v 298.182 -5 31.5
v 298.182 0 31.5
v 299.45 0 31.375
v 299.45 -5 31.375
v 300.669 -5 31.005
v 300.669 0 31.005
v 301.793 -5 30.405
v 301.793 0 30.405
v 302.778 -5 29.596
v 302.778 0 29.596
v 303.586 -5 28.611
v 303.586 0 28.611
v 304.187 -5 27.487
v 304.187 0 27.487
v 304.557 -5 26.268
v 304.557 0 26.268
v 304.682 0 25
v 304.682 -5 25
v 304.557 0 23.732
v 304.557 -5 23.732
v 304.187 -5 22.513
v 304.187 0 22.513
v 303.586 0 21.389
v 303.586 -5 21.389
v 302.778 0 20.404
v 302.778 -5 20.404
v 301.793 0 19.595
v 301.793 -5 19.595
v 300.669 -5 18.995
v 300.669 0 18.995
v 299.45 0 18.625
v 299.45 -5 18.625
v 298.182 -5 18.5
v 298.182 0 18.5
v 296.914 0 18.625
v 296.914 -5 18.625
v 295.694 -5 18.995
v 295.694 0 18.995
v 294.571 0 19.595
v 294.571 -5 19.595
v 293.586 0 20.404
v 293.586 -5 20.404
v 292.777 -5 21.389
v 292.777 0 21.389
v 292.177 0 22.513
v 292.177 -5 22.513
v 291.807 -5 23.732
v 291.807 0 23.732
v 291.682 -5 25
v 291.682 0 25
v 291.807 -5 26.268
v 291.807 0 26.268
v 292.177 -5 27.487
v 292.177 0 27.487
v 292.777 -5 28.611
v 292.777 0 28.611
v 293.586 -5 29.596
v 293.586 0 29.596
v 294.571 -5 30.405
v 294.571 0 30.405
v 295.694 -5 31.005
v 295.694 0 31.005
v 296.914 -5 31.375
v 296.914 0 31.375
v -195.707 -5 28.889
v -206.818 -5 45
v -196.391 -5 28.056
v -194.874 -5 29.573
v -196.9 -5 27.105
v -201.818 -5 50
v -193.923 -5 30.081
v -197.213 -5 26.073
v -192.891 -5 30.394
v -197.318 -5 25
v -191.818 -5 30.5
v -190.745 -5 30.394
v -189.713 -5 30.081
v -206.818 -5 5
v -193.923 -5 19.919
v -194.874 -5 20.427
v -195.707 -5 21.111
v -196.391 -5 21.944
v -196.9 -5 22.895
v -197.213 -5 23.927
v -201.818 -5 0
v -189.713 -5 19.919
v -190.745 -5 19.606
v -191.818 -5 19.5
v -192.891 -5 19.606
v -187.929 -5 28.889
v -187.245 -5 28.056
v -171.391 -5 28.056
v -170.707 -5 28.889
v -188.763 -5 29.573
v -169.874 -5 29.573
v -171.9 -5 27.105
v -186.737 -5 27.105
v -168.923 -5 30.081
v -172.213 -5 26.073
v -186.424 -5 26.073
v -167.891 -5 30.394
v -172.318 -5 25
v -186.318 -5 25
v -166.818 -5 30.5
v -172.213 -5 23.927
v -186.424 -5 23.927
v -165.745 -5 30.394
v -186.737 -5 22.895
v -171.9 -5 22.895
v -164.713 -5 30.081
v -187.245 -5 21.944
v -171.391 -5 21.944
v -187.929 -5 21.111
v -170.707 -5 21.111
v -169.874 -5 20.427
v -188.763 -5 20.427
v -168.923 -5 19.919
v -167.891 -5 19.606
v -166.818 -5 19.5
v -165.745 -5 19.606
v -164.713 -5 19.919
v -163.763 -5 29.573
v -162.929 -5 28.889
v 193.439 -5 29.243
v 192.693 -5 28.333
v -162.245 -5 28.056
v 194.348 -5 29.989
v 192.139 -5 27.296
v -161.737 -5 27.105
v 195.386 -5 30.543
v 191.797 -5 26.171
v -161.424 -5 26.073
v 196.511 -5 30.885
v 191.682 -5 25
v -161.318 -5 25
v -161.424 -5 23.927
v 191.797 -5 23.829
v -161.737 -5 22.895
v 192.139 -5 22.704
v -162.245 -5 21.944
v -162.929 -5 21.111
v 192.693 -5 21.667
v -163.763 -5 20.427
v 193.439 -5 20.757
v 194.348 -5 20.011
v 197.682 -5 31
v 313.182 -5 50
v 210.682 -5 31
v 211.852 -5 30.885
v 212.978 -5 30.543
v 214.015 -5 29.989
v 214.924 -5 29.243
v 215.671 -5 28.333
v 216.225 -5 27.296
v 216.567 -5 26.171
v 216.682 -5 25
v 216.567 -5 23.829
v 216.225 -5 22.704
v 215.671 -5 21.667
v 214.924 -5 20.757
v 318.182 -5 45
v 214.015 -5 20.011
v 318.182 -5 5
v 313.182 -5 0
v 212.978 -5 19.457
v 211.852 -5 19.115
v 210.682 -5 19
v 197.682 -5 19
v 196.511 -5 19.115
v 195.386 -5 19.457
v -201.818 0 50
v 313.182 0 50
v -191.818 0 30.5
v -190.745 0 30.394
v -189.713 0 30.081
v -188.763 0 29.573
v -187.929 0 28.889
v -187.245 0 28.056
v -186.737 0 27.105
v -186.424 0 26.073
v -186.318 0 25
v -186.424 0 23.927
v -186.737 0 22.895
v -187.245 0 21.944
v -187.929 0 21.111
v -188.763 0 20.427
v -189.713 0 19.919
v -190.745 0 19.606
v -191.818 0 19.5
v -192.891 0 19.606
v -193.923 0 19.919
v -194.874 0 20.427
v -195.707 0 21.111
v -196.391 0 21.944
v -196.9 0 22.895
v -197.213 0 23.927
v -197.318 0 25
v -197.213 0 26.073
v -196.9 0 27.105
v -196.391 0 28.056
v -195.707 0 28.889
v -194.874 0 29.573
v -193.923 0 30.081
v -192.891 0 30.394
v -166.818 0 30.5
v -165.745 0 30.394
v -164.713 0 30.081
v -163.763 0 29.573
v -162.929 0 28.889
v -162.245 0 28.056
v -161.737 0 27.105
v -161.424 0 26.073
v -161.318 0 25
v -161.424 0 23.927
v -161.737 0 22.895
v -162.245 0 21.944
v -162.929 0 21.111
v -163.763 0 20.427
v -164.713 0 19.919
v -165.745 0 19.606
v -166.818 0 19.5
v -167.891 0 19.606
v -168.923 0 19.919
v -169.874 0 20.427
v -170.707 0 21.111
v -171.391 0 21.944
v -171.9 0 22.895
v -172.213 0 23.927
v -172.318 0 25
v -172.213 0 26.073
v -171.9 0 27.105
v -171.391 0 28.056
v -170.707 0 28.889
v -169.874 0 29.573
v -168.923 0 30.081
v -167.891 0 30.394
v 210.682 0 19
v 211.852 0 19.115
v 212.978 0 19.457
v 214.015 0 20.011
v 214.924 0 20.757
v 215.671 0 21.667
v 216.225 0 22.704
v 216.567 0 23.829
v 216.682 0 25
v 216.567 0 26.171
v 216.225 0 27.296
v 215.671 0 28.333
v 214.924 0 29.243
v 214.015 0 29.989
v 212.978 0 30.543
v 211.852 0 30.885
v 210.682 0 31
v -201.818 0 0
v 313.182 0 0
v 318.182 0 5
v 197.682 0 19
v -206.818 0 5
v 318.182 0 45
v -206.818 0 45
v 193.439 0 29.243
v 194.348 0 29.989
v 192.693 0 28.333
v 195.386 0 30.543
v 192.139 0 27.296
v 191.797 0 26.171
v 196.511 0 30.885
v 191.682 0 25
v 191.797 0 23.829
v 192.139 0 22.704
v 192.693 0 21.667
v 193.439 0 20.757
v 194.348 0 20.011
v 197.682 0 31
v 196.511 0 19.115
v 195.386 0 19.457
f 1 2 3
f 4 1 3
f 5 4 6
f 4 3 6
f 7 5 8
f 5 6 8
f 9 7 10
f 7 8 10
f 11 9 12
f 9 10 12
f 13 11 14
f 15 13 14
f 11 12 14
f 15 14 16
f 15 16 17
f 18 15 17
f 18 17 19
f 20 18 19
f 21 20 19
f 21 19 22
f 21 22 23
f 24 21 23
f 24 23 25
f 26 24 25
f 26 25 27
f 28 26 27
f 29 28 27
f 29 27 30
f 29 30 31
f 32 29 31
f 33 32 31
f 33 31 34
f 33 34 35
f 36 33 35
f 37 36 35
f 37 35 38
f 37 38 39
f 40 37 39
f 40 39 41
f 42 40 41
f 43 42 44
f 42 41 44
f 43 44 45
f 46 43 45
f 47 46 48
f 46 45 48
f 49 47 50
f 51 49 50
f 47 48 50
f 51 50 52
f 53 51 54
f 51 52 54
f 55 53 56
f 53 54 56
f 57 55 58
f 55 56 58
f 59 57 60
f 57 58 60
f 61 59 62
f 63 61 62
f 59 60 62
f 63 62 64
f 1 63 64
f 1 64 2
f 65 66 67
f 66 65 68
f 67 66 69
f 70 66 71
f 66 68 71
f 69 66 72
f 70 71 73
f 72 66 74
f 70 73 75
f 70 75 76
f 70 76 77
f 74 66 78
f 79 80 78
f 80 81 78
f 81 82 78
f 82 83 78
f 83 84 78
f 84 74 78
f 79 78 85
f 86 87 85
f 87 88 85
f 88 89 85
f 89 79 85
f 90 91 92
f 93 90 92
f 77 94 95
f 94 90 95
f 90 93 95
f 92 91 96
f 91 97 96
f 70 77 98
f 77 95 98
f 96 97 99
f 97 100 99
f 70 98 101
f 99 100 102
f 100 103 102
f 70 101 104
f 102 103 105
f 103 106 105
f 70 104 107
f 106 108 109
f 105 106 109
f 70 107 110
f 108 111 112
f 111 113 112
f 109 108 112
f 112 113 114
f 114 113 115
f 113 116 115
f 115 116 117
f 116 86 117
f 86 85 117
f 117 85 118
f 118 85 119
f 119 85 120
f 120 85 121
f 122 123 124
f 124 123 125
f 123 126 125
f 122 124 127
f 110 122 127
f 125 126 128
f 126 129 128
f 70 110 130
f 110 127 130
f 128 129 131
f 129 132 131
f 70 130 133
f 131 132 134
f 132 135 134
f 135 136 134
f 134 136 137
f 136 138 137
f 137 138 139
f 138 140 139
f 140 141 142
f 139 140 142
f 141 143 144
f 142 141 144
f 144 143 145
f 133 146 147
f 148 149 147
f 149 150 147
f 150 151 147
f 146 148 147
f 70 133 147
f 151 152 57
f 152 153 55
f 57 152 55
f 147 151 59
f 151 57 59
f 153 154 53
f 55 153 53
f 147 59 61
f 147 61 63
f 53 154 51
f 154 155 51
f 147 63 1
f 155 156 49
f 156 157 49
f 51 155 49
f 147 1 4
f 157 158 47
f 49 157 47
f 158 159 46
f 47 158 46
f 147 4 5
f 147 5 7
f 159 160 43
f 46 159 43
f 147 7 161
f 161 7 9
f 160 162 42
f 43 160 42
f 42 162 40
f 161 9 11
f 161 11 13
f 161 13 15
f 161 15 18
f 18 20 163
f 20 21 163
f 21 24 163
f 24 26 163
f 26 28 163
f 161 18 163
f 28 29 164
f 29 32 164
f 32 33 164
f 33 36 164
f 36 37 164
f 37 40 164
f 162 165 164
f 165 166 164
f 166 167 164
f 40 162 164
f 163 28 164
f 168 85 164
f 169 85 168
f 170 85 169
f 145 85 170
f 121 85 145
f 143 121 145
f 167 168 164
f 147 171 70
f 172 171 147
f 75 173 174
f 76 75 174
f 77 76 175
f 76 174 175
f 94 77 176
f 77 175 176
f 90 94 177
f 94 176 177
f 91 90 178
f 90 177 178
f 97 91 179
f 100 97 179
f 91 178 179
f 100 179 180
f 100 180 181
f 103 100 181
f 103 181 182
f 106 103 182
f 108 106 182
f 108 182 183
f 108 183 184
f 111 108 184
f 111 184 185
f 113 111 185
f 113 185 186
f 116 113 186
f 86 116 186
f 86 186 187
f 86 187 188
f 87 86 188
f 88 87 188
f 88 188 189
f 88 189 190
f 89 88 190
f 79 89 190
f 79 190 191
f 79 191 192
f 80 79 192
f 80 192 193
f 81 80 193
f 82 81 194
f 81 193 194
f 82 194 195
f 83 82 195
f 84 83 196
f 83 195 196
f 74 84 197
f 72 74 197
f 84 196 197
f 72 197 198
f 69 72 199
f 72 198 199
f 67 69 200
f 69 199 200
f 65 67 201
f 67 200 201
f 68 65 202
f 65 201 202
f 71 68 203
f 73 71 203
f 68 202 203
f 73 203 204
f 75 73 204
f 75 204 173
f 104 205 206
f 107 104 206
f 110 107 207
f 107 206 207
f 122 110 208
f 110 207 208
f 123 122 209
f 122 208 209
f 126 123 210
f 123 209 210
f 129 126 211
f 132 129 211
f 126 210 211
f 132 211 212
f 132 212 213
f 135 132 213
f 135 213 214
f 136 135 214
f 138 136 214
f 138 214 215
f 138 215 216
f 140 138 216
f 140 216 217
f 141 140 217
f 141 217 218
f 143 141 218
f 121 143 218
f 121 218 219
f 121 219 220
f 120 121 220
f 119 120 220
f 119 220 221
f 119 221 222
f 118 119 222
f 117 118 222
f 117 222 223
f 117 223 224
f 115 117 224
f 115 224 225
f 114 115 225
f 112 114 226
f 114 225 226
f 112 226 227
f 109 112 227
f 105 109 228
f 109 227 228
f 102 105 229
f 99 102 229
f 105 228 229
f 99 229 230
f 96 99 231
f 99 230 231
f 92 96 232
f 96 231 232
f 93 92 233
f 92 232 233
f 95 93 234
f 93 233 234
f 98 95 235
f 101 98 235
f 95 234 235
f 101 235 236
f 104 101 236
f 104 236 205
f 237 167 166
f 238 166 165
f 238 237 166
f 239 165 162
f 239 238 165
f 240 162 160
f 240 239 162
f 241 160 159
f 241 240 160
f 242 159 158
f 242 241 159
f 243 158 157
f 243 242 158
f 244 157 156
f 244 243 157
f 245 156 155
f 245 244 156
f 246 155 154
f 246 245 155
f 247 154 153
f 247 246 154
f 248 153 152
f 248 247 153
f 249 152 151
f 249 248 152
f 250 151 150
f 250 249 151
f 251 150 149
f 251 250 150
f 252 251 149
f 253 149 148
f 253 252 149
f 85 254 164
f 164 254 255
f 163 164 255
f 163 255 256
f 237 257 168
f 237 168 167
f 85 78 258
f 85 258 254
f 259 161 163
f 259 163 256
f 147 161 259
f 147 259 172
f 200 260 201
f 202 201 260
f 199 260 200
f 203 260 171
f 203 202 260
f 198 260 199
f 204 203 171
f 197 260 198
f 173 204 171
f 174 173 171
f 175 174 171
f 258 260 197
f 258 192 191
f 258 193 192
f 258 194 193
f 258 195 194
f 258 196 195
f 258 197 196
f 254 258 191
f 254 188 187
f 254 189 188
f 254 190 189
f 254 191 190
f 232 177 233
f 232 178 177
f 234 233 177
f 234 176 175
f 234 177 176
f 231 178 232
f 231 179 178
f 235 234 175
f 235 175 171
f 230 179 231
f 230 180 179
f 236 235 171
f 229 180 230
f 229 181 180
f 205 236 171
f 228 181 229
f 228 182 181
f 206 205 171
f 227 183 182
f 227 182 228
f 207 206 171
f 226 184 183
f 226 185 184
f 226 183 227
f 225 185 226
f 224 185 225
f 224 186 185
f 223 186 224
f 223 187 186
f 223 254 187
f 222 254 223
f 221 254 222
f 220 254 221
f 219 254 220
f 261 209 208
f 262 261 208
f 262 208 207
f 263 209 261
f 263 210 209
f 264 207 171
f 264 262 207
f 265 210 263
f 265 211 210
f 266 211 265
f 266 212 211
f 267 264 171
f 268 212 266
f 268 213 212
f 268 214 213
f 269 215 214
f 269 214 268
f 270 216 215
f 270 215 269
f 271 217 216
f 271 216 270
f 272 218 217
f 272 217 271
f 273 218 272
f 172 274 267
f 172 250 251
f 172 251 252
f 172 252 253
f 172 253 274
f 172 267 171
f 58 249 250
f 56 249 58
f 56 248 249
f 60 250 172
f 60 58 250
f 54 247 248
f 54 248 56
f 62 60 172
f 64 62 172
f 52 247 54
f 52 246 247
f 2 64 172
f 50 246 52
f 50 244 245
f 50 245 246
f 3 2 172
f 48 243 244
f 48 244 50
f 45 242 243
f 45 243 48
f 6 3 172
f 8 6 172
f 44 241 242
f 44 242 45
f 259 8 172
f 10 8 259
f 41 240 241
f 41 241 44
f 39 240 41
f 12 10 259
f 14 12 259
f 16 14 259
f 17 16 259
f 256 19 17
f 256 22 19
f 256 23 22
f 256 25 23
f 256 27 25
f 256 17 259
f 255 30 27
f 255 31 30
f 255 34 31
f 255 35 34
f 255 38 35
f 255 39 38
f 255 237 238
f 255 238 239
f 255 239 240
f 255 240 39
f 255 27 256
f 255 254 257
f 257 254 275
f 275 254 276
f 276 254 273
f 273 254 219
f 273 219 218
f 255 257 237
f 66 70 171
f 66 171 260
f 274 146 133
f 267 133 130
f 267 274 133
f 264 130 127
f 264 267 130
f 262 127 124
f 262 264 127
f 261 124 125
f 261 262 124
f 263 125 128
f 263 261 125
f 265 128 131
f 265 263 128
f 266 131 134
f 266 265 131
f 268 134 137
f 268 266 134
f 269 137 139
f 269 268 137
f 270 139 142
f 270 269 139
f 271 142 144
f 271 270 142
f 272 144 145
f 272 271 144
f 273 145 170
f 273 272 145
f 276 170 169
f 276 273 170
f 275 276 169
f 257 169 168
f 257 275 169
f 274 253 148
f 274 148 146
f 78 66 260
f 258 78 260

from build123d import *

# Parameters (mm, degrees)
SKETCH_1_W             = 525
SKETCH_1_H             = 5
SM_BASE_FLANGE_1_DEPTH = 50
SKETCH_6_R             = 5.5
CUT_EXTRUDE_1_DEPTH    = 10
CUT_EXTRUDE_2_DEPTH    = 10
SKETCH_8_R             = 6.5
CUT_EXTRUDE_3_DEPTH    = 10
OTHER_START            = -5
OTHER_1_DEPTH          = 5


# Read off the part's stored shape, not the designer's step: Затупленный угол1
# Sheet-metal steps are written as plain solids
with BuildPart() as part:
    # Sketch 1 → Базовая кромка1 (new body)
    with BuildSketch(Plane.XY):
        with Locations((55.681818182, -2.5)):
            Rectangle(SKETCH_1_W, SKETCH_1_H)
    extrude(amount=SM_BASE_FLANGE_1_DEPTH)

    # Эскиз6 → Вырез-Вытянуть1 (cut)
    with BuildSketch(Plane(origin=(0, 0, 0), x_dir=(1, 0, 0), z_dir=(0, 1, 0))):
        with Locations(Location((-191.818181818, -25, 0), (0, 0, 270))):
            Circle(SKETCH_6_R)
        with Locations(Location((-166.818181818, -25, 0), (0, 0, 270))):
            Circle(SKETCH_6_R)
    extrude(amount=-CUT_EXTRUDE_1_DEPTH, mode=Mode.SUBTRACT)

    # Эскиз7 → Вырез-Вытянуть2 (cut)
    with BuildSketch(Plane(origin=(0, 0, 0), x_dir=(1, 0, 0), z_dir=(0, 1, 0))):
        with BuildLine():
            Line((197.681818182, -19), (210.681818182, -19))
            ThreePointArc((210.681818182, -19), (216.681818182, -25), (210.681818182, -31))
            Line((210.681818182, -31), (197.681818182, -31))
            ThreePointArc((197.681818182, -31), (191.681818182, -25), (197.681818182, -19))
        make_face()
    extrude(amount=-CUT_EXTRUDE_2_DEPTH, mode=Mode.SUBTRACT)

    # Эскиз8 → Вырез-Вытянуть3 (cut)
    with BuildSketch(Plane(origin=(0, 0, 0), x_dir=(1, 0, 0), z_dir=(0, 1, 0))):
        with Locations(Location((298.181818182, -25, 0), (0, 0, 270))):
            Circle(SKETCH_8_R)
    extrude(amount=-CUT_EXTRUDE_3_DEPTH, mode=Mode.SUBTRACT)

    # Other 1 outline → Other 1 (cut)
    with BuildSketch(Plane(origin=(0, 0, 0), x_dir=(1, 0, 0), z_dir=(0, 1, 0)).offset(OTHER_START)):
        Polygon((318.181818182, 0), (313.181818182, 0), (318.181818182, -5), align=None)
        Polygon((-206.818181818, -5), (-201.818181818, 0), (-206.818181818, 0), align=None)
        Polygon((318.181818182, -50), (318.181818182, -45), (313.181818182, -50), align=None)
        Polygon((-201.818181818, -50), (-206.818181818, -45), (-206.818181818, -50), align=None)
    extrude(amount=OTHER_1_DEPTH, mode=Mode.SUBTRACT)


solid = part.part
